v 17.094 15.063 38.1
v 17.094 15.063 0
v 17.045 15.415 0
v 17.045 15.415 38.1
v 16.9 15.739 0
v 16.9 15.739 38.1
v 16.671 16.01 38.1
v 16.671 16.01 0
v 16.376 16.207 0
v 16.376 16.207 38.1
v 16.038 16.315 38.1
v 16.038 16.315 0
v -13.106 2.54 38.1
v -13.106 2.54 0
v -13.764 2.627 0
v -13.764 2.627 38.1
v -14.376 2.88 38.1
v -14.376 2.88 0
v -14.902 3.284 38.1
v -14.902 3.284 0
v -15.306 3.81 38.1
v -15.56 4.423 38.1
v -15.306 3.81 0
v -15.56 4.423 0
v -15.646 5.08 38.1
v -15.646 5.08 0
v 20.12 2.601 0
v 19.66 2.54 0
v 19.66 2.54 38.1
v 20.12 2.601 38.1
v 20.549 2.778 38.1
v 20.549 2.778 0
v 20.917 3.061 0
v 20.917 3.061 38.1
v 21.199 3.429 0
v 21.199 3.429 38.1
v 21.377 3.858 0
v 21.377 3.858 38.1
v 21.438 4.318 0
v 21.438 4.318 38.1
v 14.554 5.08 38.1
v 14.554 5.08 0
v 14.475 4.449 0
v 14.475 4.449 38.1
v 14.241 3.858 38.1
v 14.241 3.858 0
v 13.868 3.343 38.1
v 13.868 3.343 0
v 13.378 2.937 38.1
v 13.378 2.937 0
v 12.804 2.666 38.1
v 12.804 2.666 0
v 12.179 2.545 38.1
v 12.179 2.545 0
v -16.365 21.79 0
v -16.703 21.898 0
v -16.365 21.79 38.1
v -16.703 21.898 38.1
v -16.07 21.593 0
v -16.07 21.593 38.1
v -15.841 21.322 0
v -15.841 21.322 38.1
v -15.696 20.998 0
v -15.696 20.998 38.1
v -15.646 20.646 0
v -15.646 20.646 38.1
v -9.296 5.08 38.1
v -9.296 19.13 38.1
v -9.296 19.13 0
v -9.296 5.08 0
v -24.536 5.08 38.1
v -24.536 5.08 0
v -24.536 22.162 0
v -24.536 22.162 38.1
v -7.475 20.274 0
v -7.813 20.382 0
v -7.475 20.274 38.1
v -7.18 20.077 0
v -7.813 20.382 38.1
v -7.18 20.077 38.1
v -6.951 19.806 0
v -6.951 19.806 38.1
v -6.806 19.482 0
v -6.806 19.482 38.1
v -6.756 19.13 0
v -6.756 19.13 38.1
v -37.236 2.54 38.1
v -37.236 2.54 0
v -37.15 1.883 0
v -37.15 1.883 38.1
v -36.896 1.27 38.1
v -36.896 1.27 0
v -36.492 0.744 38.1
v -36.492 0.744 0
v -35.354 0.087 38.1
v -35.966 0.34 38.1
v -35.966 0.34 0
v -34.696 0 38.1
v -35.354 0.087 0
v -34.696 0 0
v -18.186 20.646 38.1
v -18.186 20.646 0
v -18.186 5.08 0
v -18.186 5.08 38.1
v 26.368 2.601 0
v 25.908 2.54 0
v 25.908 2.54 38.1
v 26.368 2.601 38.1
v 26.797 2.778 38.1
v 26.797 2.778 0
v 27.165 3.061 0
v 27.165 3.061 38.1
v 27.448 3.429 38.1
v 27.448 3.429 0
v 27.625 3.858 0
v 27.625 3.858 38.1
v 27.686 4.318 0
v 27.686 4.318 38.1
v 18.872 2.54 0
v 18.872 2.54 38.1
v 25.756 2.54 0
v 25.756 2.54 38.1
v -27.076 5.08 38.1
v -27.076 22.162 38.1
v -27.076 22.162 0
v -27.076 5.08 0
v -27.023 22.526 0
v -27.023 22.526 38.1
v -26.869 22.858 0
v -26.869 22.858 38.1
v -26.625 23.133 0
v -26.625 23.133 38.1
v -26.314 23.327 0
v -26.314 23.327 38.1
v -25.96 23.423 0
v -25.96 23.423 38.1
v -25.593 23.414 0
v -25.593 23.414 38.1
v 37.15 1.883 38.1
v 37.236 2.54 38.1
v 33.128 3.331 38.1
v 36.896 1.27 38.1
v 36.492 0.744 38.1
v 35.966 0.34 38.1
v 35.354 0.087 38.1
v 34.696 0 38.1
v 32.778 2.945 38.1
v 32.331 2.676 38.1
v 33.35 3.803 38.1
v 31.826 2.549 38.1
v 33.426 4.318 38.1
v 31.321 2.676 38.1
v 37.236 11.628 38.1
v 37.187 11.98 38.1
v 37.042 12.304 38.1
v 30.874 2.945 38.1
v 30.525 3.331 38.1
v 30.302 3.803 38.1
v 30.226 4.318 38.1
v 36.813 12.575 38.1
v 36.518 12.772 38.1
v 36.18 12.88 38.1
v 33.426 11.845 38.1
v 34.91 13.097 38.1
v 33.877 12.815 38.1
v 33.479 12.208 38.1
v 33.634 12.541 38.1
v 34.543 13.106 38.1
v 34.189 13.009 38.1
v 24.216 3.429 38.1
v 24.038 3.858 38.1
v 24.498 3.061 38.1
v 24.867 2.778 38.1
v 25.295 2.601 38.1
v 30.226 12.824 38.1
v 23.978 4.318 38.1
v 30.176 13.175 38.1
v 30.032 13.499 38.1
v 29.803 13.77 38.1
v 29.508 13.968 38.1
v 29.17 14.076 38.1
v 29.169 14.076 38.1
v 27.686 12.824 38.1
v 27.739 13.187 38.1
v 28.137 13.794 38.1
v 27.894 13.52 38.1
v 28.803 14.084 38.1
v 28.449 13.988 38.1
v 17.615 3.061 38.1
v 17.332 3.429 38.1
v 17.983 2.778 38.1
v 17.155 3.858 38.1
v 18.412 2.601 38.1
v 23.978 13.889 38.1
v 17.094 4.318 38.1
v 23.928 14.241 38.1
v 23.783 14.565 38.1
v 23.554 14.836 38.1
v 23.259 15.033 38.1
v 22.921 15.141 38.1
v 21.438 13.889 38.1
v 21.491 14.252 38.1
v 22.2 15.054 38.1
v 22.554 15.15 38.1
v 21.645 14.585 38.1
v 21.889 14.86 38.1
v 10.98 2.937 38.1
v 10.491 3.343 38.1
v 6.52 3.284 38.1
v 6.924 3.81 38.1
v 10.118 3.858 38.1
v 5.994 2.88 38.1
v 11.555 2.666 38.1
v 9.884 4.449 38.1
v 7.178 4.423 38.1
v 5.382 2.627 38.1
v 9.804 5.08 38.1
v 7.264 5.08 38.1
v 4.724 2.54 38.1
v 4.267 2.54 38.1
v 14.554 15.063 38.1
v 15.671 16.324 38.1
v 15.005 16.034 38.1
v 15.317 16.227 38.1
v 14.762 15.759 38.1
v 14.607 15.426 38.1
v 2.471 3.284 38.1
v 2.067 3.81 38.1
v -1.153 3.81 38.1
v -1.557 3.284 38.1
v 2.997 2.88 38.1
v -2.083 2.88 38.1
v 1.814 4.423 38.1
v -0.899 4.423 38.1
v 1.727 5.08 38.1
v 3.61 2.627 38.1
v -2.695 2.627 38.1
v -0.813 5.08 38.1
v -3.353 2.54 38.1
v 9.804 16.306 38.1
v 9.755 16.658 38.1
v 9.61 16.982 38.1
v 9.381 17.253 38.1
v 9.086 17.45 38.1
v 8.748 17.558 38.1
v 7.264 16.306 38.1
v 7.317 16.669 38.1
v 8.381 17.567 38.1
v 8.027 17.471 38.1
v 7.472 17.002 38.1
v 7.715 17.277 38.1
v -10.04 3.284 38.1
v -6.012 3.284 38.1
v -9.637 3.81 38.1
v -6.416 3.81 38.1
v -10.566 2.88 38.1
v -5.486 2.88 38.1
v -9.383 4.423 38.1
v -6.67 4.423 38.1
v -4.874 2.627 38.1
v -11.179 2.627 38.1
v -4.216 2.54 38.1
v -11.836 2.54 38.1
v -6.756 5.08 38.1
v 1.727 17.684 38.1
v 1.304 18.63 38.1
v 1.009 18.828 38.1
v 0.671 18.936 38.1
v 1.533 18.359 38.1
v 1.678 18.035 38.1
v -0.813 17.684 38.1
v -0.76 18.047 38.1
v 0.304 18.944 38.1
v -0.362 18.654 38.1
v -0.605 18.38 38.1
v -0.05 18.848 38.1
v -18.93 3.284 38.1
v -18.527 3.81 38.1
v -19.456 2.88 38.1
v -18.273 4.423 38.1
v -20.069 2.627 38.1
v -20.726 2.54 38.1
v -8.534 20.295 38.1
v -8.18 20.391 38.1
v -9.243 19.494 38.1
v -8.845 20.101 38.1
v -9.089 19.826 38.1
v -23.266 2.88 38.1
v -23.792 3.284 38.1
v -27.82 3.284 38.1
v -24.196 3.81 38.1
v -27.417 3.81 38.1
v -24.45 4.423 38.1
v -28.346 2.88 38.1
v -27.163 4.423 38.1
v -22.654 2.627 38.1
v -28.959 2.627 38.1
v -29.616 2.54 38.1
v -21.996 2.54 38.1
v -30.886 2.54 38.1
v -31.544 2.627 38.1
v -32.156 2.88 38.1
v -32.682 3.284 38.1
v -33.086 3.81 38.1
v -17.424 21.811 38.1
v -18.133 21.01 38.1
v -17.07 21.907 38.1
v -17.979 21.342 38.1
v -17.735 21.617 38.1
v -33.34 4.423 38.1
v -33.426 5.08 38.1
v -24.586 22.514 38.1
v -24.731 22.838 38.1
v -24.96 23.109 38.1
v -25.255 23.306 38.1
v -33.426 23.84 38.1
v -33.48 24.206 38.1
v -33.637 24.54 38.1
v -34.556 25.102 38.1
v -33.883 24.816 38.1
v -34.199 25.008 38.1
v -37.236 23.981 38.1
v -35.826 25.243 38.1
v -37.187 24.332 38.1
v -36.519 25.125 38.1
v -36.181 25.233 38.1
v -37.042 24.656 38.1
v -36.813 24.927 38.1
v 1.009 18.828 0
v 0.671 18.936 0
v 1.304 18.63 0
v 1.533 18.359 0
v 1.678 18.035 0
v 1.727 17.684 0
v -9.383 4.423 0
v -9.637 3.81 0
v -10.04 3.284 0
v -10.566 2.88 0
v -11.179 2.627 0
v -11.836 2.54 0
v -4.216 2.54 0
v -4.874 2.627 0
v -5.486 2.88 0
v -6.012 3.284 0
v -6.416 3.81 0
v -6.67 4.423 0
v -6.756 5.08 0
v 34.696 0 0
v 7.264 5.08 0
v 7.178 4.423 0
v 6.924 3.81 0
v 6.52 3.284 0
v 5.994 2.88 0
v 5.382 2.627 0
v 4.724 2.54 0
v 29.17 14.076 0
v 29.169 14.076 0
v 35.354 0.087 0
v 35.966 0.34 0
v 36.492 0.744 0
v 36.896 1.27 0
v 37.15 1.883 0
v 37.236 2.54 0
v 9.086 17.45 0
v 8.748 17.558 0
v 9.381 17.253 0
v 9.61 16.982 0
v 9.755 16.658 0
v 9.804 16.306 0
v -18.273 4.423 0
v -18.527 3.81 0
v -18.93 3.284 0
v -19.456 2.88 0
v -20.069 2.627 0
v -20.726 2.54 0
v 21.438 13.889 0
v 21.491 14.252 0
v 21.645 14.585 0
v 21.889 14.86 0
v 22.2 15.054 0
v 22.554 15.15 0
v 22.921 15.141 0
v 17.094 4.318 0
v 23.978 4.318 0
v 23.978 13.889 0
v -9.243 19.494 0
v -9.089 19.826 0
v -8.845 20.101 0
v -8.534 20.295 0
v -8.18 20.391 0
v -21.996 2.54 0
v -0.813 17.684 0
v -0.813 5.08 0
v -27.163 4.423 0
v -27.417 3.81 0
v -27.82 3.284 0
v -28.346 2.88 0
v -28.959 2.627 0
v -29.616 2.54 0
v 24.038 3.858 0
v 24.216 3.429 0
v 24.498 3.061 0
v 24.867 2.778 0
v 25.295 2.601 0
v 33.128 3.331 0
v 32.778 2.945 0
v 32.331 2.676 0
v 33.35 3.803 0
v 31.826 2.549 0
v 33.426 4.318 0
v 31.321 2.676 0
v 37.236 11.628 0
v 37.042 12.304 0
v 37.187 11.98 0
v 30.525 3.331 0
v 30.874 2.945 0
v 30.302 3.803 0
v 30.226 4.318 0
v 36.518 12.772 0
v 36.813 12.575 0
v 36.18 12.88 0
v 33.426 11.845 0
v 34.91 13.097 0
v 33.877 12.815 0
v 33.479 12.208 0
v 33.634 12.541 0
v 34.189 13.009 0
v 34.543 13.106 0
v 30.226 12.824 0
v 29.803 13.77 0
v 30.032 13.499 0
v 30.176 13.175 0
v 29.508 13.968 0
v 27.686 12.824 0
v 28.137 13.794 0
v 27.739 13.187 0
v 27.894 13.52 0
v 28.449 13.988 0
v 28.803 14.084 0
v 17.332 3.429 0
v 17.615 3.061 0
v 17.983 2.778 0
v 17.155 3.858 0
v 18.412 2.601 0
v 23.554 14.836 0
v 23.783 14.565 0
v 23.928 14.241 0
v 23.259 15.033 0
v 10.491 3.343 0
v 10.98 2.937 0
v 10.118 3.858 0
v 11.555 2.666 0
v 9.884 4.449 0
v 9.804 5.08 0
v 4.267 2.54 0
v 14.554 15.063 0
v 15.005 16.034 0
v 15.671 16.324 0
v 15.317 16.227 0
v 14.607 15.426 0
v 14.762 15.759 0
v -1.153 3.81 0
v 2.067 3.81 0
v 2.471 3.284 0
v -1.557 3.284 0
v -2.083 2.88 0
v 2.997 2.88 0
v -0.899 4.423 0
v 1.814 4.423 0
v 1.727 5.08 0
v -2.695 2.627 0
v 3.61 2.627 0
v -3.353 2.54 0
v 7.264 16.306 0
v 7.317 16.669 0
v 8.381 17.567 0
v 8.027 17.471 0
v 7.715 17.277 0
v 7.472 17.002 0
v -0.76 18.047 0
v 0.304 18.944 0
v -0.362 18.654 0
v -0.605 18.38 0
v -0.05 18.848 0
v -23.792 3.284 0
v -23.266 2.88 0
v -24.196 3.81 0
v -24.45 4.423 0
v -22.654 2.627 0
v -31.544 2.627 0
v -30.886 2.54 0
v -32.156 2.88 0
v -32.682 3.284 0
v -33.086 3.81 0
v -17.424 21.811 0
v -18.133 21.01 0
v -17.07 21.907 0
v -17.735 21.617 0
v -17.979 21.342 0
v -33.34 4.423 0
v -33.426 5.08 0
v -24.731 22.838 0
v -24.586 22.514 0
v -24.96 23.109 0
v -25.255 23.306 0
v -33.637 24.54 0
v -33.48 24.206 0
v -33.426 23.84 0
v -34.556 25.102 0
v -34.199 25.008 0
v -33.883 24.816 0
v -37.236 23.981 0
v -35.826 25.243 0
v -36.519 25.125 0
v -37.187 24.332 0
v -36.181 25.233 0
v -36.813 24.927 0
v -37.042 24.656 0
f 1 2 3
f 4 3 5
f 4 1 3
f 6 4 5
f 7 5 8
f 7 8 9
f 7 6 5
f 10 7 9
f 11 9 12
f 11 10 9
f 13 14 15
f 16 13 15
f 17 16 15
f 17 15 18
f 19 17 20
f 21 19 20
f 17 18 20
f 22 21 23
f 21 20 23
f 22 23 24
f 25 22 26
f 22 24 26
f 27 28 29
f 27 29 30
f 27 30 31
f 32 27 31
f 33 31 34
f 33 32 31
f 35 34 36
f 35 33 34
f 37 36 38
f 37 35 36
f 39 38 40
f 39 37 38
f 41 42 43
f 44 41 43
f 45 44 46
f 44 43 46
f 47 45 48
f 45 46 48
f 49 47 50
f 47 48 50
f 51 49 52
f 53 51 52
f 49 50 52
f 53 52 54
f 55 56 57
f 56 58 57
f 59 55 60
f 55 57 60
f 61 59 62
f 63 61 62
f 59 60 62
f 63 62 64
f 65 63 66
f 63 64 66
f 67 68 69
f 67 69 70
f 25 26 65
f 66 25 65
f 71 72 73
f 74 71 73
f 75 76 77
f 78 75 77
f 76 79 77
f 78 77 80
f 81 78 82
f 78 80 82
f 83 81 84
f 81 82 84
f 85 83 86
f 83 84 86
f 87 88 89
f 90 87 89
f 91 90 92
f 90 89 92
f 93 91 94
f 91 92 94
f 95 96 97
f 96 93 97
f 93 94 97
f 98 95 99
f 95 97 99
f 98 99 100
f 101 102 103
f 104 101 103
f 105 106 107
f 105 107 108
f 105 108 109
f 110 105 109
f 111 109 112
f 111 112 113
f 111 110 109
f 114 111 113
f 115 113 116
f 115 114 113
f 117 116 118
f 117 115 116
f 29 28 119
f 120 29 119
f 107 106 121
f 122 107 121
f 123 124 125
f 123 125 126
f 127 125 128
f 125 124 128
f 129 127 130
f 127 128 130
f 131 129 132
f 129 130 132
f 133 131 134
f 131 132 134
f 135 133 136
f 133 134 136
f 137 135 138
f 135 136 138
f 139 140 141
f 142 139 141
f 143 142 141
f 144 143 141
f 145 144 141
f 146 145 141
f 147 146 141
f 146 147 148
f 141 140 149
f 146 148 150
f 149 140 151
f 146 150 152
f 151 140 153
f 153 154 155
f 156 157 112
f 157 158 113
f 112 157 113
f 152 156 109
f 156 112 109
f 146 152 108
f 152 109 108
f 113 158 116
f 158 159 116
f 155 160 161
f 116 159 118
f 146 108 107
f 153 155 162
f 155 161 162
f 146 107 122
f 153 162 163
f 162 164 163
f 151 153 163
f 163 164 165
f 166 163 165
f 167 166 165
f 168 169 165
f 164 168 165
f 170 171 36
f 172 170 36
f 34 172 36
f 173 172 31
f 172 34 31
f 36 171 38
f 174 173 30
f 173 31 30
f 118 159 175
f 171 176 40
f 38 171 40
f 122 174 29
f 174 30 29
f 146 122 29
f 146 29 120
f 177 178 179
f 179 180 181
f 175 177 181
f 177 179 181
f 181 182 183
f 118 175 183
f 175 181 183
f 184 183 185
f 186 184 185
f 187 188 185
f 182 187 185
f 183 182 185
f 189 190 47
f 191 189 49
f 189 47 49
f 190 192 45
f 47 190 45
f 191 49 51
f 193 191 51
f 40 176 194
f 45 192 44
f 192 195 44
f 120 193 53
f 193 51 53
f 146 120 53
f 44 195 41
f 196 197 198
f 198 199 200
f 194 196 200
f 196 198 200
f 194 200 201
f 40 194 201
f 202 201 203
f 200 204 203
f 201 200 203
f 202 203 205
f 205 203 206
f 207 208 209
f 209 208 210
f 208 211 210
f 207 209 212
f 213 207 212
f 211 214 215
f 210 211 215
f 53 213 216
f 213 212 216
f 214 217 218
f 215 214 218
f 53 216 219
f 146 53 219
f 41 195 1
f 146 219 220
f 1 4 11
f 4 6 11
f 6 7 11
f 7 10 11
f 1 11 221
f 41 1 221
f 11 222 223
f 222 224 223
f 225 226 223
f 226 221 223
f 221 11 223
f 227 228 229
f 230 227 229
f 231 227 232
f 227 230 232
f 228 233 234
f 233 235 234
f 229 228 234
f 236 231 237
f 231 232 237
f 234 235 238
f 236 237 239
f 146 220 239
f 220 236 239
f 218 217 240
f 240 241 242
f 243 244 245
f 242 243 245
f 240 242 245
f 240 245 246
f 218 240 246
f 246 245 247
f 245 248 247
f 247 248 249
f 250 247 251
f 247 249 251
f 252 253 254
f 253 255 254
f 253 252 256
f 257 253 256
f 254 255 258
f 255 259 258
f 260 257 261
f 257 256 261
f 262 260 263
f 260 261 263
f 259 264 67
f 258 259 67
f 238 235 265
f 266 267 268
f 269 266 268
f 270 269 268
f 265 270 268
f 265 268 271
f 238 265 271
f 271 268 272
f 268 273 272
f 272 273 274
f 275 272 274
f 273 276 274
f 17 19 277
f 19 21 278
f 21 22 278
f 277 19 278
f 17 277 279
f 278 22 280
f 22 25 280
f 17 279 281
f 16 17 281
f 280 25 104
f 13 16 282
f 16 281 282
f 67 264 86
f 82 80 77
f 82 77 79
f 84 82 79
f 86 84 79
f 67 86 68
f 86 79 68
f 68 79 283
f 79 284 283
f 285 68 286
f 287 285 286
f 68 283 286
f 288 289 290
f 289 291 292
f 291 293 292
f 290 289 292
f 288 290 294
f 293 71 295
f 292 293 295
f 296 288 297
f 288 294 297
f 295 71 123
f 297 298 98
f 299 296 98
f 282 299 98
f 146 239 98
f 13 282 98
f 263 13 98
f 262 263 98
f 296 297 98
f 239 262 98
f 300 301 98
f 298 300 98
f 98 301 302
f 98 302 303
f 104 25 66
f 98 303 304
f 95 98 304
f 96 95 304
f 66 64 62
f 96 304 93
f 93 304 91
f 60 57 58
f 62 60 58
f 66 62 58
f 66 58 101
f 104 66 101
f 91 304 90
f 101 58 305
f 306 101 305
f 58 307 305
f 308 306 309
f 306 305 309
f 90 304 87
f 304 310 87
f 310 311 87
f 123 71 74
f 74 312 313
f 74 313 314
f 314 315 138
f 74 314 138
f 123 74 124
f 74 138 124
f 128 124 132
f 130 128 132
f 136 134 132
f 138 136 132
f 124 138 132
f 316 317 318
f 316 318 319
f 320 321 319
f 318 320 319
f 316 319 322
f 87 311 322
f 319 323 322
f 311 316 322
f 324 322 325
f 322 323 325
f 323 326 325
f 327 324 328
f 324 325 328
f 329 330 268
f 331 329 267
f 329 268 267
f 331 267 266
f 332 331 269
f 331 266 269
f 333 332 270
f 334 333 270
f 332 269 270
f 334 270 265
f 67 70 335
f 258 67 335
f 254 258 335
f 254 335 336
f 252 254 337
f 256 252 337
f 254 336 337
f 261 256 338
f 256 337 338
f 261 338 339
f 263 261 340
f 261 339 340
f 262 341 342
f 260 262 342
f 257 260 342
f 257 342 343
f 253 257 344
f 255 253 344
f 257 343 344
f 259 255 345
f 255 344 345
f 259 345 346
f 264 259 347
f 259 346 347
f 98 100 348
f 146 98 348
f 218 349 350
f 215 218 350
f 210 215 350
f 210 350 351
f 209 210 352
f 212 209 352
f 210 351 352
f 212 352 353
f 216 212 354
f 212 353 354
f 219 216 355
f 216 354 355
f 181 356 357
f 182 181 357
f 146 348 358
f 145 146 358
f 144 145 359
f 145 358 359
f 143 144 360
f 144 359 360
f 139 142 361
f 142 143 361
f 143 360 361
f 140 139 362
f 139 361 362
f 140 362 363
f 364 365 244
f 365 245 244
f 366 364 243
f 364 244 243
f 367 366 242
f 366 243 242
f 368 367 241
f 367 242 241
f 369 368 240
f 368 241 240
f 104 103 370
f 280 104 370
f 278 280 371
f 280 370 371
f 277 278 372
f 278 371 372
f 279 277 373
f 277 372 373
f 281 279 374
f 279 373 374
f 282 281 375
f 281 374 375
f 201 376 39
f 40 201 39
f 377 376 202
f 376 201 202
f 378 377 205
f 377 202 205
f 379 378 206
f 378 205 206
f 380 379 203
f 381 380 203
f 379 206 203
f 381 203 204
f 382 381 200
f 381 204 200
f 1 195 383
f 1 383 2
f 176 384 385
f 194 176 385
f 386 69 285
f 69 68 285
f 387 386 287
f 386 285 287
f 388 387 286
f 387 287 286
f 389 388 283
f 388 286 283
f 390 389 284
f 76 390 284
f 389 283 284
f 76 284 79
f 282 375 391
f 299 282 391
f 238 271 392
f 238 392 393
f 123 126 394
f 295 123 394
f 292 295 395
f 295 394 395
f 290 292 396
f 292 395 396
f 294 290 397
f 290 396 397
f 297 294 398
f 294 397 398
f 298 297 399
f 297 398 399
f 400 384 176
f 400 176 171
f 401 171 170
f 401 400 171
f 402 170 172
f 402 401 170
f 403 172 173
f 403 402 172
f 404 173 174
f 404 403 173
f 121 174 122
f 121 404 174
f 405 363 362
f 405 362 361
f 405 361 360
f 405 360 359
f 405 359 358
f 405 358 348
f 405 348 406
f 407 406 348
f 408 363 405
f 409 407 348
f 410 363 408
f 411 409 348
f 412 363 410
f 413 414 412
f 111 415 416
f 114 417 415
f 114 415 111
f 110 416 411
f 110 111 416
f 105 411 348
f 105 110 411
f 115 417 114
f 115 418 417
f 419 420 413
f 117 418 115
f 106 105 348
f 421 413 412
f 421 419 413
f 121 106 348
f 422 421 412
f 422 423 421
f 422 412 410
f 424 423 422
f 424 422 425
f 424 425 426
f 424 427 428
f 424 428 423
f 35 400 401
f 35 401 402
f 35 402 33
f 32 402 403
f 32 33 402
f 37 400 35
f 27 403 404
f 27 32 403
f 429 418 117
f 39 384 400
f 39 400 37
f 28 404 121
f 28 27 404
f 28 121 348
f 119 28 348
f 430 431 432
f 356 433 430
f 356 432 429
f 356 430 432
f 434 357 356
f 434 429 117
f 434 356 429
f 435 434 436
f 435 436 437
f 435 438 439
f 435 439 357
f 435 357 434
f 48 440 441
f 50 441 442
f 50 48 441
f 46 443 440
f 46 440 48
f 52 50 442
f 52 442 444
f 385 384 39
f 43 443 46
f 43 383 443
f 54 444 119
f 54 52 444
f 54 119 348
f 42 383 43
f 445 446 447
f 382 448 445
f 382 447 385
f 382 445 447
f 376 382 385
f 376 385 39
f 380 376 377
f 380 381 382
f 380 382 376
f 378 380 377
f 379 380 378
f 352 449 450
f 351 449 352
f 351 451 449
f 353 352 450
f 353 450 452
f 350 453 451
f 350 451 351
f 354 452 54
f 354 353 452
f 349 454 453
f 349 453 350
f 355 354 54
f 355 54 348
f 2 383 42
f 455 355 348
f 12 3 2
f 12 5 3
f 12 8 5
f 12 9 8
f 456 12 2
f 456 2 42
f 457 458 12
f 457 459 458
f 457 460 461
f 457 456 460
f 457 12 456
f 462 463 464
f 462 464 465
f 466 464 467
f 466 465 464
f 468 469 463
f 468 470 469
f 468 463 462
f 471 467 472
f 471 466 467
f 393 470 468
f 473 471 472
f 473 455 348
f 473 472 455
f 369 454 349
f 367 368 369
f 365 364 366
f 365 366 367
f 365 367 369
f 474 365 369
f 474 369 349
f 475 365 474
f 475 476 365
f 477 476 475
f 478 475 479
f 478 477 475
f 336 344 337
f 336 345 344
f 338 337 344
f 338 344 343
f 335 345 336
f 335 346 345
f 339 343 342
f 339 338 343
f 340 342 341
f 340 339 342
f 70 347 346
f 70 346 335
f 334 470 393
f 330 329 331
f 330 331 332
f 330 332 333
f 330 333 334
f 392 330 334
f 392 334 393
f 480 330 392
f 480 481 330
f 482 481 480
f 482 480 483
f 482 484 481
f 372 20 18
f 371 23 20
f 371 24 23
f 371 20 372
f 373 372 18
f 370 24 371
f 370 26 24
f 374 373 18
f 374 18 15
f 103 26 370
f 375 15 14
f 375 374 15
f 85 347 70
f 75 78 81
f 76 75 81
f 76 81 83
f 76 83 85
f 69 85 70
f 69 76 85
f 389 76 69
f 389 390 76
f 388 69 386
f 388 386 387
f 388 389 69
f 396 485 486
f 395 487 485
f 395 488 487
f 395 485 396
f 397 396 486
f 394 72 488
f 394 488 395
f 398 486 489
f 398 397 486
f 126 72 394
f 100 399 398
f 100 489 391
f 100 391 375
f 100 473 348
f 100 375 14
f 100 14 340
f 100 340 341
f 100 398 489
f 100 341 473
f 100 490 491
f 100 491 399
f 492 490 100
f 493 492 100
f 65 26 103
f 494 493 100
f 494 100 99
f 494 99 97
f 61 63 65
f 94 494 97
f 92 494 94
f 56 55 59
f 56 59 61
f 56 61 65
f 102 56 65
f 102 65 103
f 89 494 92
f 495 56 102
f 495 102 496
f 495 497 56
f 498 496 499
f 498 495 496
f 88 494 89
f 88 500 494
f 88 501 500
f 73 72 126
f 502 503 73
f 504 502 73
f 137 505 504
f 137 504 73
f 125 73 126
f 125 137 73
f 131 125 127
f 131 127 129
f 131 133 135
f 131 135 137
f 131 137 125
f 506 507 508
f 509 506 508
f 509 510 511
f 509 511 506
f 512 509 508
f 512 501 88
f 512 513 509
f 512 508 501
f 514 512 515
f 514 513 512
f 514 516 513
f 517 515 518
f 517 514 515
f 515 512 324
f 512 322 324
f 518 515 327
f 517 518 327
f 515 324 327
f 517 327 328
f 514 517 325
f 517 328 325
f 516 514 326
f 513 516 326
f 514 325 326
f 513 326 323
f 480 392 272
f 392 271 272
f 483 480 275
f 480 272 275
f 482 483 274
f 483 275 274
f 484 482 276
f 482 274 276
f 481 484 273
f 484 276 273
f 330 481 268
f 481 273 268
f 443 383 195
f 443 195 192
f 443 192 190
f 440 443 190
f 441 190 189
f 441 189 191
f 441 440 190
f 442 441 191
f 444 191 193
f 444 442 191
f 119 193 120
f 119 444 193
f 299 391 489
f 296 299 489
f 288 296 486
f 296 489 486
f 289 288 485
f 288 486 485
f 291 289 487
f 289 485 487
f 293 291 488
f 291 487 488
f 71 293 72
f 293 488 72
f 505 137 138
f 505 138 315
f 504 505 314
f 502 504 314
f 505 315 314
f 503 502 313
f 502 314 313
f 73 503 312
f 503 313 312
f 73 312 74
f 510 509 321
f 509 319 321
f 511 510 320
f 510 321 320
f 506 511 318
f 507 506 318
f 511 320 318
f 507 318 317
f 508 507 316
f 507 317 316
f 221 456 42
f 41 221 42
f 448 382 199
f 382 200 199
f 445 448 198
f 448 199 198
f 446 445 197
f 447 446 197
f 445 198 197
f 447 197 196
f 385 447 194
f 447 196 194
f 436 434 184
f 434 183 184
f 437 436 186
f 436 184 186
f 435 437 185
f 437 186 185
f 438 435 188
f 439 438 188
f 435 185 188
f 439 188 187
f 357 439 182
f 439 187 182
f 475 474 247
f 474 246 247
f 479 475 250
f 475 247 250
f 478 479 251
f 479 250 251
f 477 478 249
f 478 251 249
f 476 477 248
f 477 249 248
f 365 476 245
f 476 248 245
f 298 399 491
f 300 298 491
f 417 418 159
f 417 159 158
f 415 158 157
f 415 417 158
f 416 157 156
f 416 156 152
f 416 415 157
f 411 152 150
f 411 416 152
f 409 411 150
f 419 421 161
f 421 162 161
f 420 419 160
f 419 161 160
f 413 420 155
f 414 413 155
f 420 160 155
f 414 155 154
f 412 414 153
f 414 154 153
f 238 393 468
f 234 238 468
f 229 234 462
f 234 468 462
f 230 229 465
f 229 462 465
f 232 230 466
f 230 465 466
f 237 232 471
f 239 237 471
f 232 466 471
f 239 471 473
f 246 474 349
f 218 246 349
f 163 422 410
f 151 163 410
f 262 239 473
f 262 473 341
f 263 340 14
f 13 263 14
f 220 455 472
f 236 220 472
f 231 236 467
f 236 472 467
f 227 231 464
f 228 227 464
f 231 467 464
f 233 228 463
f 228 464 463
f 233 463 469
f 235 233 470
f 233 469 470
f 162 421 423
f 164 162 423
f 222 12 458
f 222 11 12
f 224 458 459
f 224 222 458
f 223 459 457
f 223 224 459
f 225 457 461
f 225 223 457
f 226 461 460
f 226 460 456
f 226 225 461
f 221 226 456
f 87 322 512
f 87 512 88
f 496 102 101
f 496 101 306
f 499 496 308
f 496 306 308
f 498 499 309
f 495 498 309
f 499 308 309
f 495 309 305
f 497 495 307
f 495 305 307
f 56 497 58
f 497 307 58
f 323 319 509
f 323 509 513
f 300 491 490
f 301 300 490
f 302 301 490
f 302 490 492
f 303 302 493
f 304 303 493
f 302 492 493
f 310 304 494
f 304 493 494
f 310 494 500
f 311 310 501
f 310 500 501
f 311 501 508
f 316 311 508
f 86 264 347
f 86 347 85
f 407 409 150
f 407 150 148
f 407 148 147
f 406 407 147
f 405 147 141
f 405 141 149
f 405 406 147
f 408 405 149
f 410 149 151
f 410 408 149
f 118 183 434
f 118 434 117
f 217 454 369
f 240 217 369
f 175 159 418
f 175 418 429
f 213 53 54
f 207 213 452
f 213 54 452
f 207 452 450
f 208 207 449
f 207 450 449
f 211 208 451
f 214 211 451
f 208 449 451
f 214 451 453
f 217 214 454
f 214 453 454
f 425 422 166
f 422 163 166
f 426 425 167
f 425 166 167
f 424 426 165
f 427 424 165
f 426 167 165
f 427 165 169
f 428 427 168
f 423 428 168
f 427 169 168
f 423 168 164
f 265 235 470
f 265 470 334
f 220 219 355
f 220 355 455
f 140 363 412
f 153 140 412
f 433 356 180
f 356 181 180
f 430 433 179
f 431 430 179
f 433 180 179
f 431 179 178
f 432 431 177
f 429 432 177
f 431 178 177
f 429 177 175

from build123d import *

# Parameters (mm, degrees)
F1_DEPTH    = 38.1
F2_T1_DEPTH = 38.1
F2_T3_DEPTH = 50.8
F3_T1_DEPTH = 38.1
F4_R        = 1.26999


# Not quite as in the source:
# - a fillet or chamfer that OpenCascade refuses, or shapes differently, is made with other operations: its cross-section is extruded or revolved along the edge and cut away or added
# - a fillet or chamfer is up to 0.001 mm smaller than in the source, because OpenCascade refuses the exact size


with BuildPart() as f1:
    # F0 (on Top) → F1 (new body)
    with BuildSketch(Plane.XY):
        Polygon((-37.2364, 25.4), (-37.2364, 0), (37.2364, 0), (37.2364, 12.7), (33.4264, 13.3497271487), (33.4264, 2.54), (30.226, 2.54), (30.226, 13.8954979536), (27.686, 14.3286493861), (27.686, 2.54), (23.9776, 2.54), (23.9776, 14.9610504775), (21.4376, 15.39420191), (21.4376, 2.54), (17.0942, 2.54), (17.0942, 16.1348908595), (14.5542, 16.568042292), (14.5542, 2.54), (9.8044, 2.54), (9.8044, 17.3780354707), (7.2644, 17.8111869031), (7.2644, 2.54), (1.7272, 2.54), (1.7272, 18.7554570259), (-0.8128, 19.1886084584), (-0.8128, 2.54), (-6.7564, 2.54), (-6.7564, 20.2021828104), (-9.2964, 20.6353342428), (-9.2964, 2.54), (-15.6464, 2.54), (-15.6464, 21.718212824), (-18.1864, 22.1513642565), (-18.1864, 2.54), (-24.5364, 2.54), (-24.5364, 23.2342428377), (-27.0764, 23.6673942701), (-27.0764, 2.54), (-33.4264, 2.54), (-33.4264, 24.9766666667), align=None)
    extrude(amount=F1_DEPTH)

    # F2: fillet of radius 2.54 on 14 edges, made by hand

    # F2_s2 → F2_t1 (join)
    with BuildSketch(Plane.XY):
        with BuildLine():
            ThreePointArc((-30.8864, 2.54), (-32.6824512242, 3.2839487758), (-33.4264, 5.08))
            Line((-33.4264, 5.08), (-33.4264, 2.54))
            Line((-33.4264, 2.54), (-30.8864, 2.54))
        make_face()
        with BuildLine():
            ThreePointArc((-27.0764, 5.08), (-27.8203487758, 3.2839487758), (-29.6164, 2.54))
            Line((-29.6164, 2.54), (-27.0764, 2.54))
            Line((-27.0764, 2.54), (-27.0764, 5.08))
        make_face()
        with BuildLine():
            ThreePointArc((-21.9964, 2.54), (-23.7924512242, 3.2839487758), (-24.5364, 5.08))
            Line((-24.5364, 5.08), (-24.5364, 2.54))
            Line((-24.5364, 2.54), (-21.9964, 2.54))
        make_face()
        with BuildLine():
            ThreePointArc((-18.1864, 5.08), (-18.9303487758, 3.2839487758), (-20.7264, 2.54))
            Line((-20.7264, 2.54), (-18.1864, 2.54))
            Line((-18.1864, 2.54), (-18.1864, 5.08))
        make_face()
        with BuildLine():
            ThreePointArc((-13.1064, 2.54), (-14.9024512242, 3.2839487758), (-15.6464, 5.08))
            Line((-15.6464, 5.08), (-15.6464, 2.54))
            Line((-15.6464, 2.54), (-13.1064, 2.54))
        make_face()
        with BuildLine():
            ThreePointArc((-9.2964, 5.08), (-10.0403487758, 3.2839487758), (-11.8364, 2.54))
            Line((-11.8364, 2.54), (-9.2964, 2.54))
            Line((-9.2964, 2.54), (-9.2964, 5.08))
        make_face()
        with BuildLine():
            ThreePointArc((-4.2164, 2.54), (-6.0124512242, 3.2839487758), (-6.7564, 5.08))
            Line((-6.7564, 5.08), (-6.7564, 2.54))
            Line((-6.7564, 2.54), (-4.2164, 2.54))
        make_face()
        with BuildLine():
            ThreePointArc((-0.8128, 5.08), (-1.5567487758, 3.2839487758), (-3.3528, 2.54))
            Line((-3.3528, 2.54), (-0.8128, 2.54))
            Line((-0.8128, 2.54), (-0.8128, 5.08))
        make_face()
        with BuildLine():
            ThreePointArc((4.2672, 2.54), (2.4711487758, 3.2839487758), (1.7272, 5.08))
            Line((1.7272, 5.08), (1.7272, 2.54))
            Line((1.7272, 2.54), (4.2672, 2.54))
        make_face()
        with BuildLine():
            ThreePointArc((7.2644, 5.08), (6.5204512242, 3.2839487758), (4.7244, 2.54))
            Line((4.7244, 2.54), (7.2644, 2.54))
            Line((7.2644, 2.54), (7.2644, 5.08))
        make_face()
        with BuildLine():
            ThreePointArc((12.3444, 2.54), (10.5483487758, 3.2839487758), (9.8044, 5.08))
            Line((9.8044, 5.08), (9.8044, 2.54))
            Line((9.8044, 2.54), (12.3444, 2.54))
        make_face()
        with BuildLine():
            ThreePointArc((14.5542, 5.08), (13.8102512242, 3.2839487758), (12.0142, 2.54))
            Line((12.0142, 2.54), (14.5542, 2.54))
            Line((14.5542, 2.54), (14.5542, 5.08))
        make_face()
    extrude(amount=F2_T1_DEPTH)

    # F2_s4 → F2_t3 (cut)
    with BuildSketch(Plane.XY.offset(-6.35)):
        with BuildLine():
            ThreePointArc((-37.2364, 2.54), (-36.4924512242, 0.7439487758), (-34.6964, 0))
            Line((-34.6964, 0), (-37.2364, 0))
            Line((-37.2364, 0), (-37.2364, 2.54))
        make_face()
        with BuildLine():
            ThreePointArc((34.6964, 0), (36.4924512242, 0.7439487758), (37.2364, 2.54))
            Line((37.2364, 2.54), (37.2364, 0))
            Line((37.2364, 0), (34.6964, 0))
        make_face()
    extrude(amount=F2_T3_DEPTH, mode=Mode.SUBTRACT)

    # F3: fillet of radius 1.778 on 6 edges, made by hand

    # F3_s2 → F3_t1 (join)
    with BuildSketch(Plane.XY):
        with BuildLine():
            ThreePointArc((17.0942, 4.318), (17.6149641431, 3.0607641431), (18.8722, 2.54))
            Line((18.8722, 2.54), (17.0942, 2.54))
            Line((17.0942, 2.54), (17.0942, 4.318))
        make_face()
        with BuildLine():
            ThreePointArc((19.6596, 2.54), (20.9168358569, 3.0607641431), (21.4376, 4.318))
            Line((21.4376, 4.318), (21.4376, 2.54))
            Line((21.4376, 2.54), (19.6596, 2.54))
        make_face()
        with BuildLine():
            ThreePointArc((23.9776, 4.318), (24.4983641431, 3.0607641431), (25.7556, 2.54))
            Line((25.7556, 2.54), (23.9776, 2.54))
            Line((23.9776, 2.54), (23.9776, 4.318))
        make_face()
        with BuildLine():
            ThreePointArc((25.908, 2.54), (27.1652358569, 3.0607641431), (27.686, 4.318))
            Line((27.686, 4.318), (27.686, 2.54))
            Line((27.686, 2.54), (25.908, 2.54))
        make_face()
        with BuildLine():
            ThreePointArc((30.226, 4.318), (30.7467641431, 3.0607641431), (32.004, 2.54))
            Line((32.004, 2.54), (30.226, 2.54))
            Line((30.226, 2.54), (30.226, 4.318))
        make_face()
        with BuildLine():
            ThreePointArc((31.6484, 2.54), (32.9056358569, 3.0607641431), (33.4264, 4.318))
            Line((33.4264, 4.318), (33.4264, 2.54))
            Line((33.4264, 2.54), (31.6484, 2.54))
        make_face()
    extrude(amount=F3_T1_DEPTH)

    # F4 (radius 1.27 in the source; OpenCascade refuses exactly that, so slightly less here)
    f4_edges = [f1.edges().sort_by_distance(p)[0] for p in [
        (33.4264, 13.349727, 19.05),
        (30.226, 13.895498, 19.05),
        (27.686, 14.328649, 19.05),
        (23.9776, 14.96105, 19.05),
        (21.4376, 15.394202, 19.05),
        (17.0942, 16.134891, 19.05),
        (14.5542, 16.568042, 19.05),
        (9.8044, 17.378035, 19.05),
        (7.2644, 17.811187, 19.05),
        (1.7272, 18.755457, 19.05),
        (-0.8128, 19.188608, 19.05),
        (-6.7564, 20.202183, 19.05),
        (-15.6464, 21.718213, 19.05),
        (-24.5364, 23.234243, 19.05),
        (-27.0764, 23.667394, 19.05),
        (-33.4264, 24.976667, 19.05),
        (-37.2364, 25.4, 19.05),
        (37.2364, 12.7, 19.05),
        (-9.2964, 20.635334, 19.05),
        (-18.1864, 22.151364, 19.05),
    ]]
    fillet(f4_edges, radius=F4_R)


solid = f1.part
